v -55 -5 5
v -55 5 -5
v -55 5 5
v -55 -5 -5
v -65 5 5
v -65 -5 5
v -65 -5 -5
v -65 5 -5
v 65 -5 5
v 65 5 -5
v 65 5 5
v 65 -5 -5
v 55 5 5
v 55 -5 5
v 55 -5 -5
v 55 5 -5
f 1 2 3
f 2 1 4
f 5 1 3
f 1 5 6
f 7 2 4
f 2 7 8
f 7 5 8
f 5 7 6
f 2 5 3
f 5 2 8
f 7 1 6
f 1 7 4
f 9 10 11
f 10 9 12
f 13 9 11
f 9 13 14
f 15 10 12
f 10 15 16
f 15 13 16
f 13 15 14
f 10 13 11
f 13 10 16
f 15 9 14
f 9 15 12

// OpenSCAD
// Test Robotic Arm - Generated by Kalki Design Engine
// Generated: 2025-11-05T19:32:10.307006
// Design Type: robotics


// Preview helpers (only rendered in OpenSCAD preview mode)
module preview_axes(axis_len=120) {
    color([1, 0, 0, 0.3]) cube([axis_len, 2, 2], center=true); // X-axis
    color([0, 1, 0, 0.3]) cube([2, axis_len, 2], center=true); // Y-axis
    color([0, 0, 1, 0.3]) cube([2, 2, axis_len], center=true); // Z-axis
}

module preview_origin_marker(size=4) {
    color([1, 0.5, 0, 0.5]) sphere(r=size);
}

// Mechanical component libraries
module servo_motor(length=60, diameter=40, shaft_diameter=6, shaft_length=20) {
    // Motor body
    color([0.3, 0.3, 0.3]) cylinder(h=length, d=diameter, center=true);
    // Mounting flanges
    color([0.4, 0.4, 0.4]) {
        translate([0, 0, length/2 + 2]) cylinder(h=4, d=diameter + 10, center=true);
        translate([0, 0, -length/2 - 2]) cylinder(h=4, d=diameter + 10, center=true);
    }
    // Shaft
    color([0.8, 0.8, 0.8]) translate([0, 0, length/2 + shaft_length/2]) cylinder(h=shaft_length, d=shaft_diameter, center=true);
    // Mounting holes
    for (angle = [0, 90, 180, 270]) {
        rotate([0, 0, angle]) translate([diameter/2 + 5, 0, 0]) cylinder(h=length + 10, d=3, center=true);
    }
}

module bearing(outer_diameter=30, inner_diameter=10, thickness=8) {
    // Outer race
    color([0.6, 0.6, 0.6]) difference() {
        cylinder(h=thickness, d=outer_diameter, center=true);
        cylinder(h=thickness + 2, d=inner_diameter, center=true);
    }
    // Inner race
    color([0.7, 0.7, 0.7]) cylinder(h=thickness - 2, d=inner_diameter + 4, center=true);
    // Balls (simplified)
    color([0.9, 0.9, 0.9]) for (angle = [0:45:315]) {
        rotate([0, 0, angle]) translate([(outer_diameter + inner_diameter)/4, 0, 0]) sphere(r=2);
    }
}

module gear(radius=25, thickness=10, teeth=20) {
    // Gear body
    color([0.4, 0.4, 0.4]) cylinder(h=thickness, d=radius*2, center=true);
    // Teeth (simplified)
    color([0.3, 0.3, 0.3]) for (angle = [0:360/teeth:359]) {
        rotate([0, 0, angle]) translate([radius - 2, 0, 0]) cube([4, 3, thickness], center=true);
    }
    // Center hole
    color([0.2, 0.2, 0.2]) cylinder(h=thickness + 2, d=8, center=true);
}

module harmonic_drive(cup_diameter=60, flex_spline_diameter=50, thickness=15) {
    // Wave generator (simplified)
    color([0.5, 0.5, 0.5]) cylinder(h=thickness, d=cup_diameter * 0.7, center=true);
    // Flex spline
    color([0.6, 0.6, 0.6]) cylinder(h=thickness - 2, d=flex_spline_diameter, center=true);
    // Circular spline
    color([0.4, 0.4, 0.4]) difference() {
        cylinder(h=thickness - 4, d=cup_diameter, center=true);
        cylinder(h=thickness, d=flex_spline_diameter + 5, center=true);
    }
}

module robotic_link(length=200, diameter=40, wall_thickness=3) {
    // Hollow cylindrical link
    color([0.8, 0.8, 0.9]) difference() {
        cylinder(h=length, d=diameter, center=true);
        cylinder(h=length + 2, d=diameter - wall_thickness*2, center=true);
    }
    // End flanges
    color([0.7, 0.7, 0.8]) {
        translate([0, 0, length/2]) cylinder(h=6, d=diameter + 10, center=true);
        translate([0, 0, -length/2]) cylinder(h=6, d=diameter + 10, center=true);
    }
    // Mounting holes
    for (z_pos = [-length/3, 0, length/3]) {
        translate([0, 0, z_pos]) for (angle = [0, 90, 180, 270]) {
            rotate([0, 0, angle]) translate([diameter/2 + 5, 0, 0]) cylinder(h=8, d=4, center=true);
        }
    }
}

module end_effector(gripper_width=80, gripper_length=60, finger_length=40) {
    // Base
    color([0.3, 0.3, 0.3]) cube([gripper_width, gripper_length, 20], center=true);
    // Fingers
    color([0.5, 0.5, 0.5]) {
        translate([-gripper_width/4, gripper_length/2 + finger_length/2, 10]) cube([8, finger_length, 4], center=true);
        translate([gripper_width/4, gripper_length/2 + finger_length/2, 10]) cube([8, finger_length, 4], center=true);
    }
    // Actuator
    translate([0, -gripper_length/4, 15]) servo_motor(30, 25, 4, 10);
}

// Component 1: <MagicMock name='base.name' id='4342586000'>
module component_0() {
    // Type: support
    cube([10, 10, 10], center=true);
}

// Component 2: <MagicMock name='arm.name' id='4342586336'>
module component_1() {
    // Type: reach
    cube([10, 10, 10], center=true);
}

// Assembly
translate([-60.00, 0.00, 0]) component_0();
translate([60.00, 0.00, 0]) component_1();


if ($preview) {
    preview_axes(axis_len=240.00);
    preview_origin_marker(size=6);
}
